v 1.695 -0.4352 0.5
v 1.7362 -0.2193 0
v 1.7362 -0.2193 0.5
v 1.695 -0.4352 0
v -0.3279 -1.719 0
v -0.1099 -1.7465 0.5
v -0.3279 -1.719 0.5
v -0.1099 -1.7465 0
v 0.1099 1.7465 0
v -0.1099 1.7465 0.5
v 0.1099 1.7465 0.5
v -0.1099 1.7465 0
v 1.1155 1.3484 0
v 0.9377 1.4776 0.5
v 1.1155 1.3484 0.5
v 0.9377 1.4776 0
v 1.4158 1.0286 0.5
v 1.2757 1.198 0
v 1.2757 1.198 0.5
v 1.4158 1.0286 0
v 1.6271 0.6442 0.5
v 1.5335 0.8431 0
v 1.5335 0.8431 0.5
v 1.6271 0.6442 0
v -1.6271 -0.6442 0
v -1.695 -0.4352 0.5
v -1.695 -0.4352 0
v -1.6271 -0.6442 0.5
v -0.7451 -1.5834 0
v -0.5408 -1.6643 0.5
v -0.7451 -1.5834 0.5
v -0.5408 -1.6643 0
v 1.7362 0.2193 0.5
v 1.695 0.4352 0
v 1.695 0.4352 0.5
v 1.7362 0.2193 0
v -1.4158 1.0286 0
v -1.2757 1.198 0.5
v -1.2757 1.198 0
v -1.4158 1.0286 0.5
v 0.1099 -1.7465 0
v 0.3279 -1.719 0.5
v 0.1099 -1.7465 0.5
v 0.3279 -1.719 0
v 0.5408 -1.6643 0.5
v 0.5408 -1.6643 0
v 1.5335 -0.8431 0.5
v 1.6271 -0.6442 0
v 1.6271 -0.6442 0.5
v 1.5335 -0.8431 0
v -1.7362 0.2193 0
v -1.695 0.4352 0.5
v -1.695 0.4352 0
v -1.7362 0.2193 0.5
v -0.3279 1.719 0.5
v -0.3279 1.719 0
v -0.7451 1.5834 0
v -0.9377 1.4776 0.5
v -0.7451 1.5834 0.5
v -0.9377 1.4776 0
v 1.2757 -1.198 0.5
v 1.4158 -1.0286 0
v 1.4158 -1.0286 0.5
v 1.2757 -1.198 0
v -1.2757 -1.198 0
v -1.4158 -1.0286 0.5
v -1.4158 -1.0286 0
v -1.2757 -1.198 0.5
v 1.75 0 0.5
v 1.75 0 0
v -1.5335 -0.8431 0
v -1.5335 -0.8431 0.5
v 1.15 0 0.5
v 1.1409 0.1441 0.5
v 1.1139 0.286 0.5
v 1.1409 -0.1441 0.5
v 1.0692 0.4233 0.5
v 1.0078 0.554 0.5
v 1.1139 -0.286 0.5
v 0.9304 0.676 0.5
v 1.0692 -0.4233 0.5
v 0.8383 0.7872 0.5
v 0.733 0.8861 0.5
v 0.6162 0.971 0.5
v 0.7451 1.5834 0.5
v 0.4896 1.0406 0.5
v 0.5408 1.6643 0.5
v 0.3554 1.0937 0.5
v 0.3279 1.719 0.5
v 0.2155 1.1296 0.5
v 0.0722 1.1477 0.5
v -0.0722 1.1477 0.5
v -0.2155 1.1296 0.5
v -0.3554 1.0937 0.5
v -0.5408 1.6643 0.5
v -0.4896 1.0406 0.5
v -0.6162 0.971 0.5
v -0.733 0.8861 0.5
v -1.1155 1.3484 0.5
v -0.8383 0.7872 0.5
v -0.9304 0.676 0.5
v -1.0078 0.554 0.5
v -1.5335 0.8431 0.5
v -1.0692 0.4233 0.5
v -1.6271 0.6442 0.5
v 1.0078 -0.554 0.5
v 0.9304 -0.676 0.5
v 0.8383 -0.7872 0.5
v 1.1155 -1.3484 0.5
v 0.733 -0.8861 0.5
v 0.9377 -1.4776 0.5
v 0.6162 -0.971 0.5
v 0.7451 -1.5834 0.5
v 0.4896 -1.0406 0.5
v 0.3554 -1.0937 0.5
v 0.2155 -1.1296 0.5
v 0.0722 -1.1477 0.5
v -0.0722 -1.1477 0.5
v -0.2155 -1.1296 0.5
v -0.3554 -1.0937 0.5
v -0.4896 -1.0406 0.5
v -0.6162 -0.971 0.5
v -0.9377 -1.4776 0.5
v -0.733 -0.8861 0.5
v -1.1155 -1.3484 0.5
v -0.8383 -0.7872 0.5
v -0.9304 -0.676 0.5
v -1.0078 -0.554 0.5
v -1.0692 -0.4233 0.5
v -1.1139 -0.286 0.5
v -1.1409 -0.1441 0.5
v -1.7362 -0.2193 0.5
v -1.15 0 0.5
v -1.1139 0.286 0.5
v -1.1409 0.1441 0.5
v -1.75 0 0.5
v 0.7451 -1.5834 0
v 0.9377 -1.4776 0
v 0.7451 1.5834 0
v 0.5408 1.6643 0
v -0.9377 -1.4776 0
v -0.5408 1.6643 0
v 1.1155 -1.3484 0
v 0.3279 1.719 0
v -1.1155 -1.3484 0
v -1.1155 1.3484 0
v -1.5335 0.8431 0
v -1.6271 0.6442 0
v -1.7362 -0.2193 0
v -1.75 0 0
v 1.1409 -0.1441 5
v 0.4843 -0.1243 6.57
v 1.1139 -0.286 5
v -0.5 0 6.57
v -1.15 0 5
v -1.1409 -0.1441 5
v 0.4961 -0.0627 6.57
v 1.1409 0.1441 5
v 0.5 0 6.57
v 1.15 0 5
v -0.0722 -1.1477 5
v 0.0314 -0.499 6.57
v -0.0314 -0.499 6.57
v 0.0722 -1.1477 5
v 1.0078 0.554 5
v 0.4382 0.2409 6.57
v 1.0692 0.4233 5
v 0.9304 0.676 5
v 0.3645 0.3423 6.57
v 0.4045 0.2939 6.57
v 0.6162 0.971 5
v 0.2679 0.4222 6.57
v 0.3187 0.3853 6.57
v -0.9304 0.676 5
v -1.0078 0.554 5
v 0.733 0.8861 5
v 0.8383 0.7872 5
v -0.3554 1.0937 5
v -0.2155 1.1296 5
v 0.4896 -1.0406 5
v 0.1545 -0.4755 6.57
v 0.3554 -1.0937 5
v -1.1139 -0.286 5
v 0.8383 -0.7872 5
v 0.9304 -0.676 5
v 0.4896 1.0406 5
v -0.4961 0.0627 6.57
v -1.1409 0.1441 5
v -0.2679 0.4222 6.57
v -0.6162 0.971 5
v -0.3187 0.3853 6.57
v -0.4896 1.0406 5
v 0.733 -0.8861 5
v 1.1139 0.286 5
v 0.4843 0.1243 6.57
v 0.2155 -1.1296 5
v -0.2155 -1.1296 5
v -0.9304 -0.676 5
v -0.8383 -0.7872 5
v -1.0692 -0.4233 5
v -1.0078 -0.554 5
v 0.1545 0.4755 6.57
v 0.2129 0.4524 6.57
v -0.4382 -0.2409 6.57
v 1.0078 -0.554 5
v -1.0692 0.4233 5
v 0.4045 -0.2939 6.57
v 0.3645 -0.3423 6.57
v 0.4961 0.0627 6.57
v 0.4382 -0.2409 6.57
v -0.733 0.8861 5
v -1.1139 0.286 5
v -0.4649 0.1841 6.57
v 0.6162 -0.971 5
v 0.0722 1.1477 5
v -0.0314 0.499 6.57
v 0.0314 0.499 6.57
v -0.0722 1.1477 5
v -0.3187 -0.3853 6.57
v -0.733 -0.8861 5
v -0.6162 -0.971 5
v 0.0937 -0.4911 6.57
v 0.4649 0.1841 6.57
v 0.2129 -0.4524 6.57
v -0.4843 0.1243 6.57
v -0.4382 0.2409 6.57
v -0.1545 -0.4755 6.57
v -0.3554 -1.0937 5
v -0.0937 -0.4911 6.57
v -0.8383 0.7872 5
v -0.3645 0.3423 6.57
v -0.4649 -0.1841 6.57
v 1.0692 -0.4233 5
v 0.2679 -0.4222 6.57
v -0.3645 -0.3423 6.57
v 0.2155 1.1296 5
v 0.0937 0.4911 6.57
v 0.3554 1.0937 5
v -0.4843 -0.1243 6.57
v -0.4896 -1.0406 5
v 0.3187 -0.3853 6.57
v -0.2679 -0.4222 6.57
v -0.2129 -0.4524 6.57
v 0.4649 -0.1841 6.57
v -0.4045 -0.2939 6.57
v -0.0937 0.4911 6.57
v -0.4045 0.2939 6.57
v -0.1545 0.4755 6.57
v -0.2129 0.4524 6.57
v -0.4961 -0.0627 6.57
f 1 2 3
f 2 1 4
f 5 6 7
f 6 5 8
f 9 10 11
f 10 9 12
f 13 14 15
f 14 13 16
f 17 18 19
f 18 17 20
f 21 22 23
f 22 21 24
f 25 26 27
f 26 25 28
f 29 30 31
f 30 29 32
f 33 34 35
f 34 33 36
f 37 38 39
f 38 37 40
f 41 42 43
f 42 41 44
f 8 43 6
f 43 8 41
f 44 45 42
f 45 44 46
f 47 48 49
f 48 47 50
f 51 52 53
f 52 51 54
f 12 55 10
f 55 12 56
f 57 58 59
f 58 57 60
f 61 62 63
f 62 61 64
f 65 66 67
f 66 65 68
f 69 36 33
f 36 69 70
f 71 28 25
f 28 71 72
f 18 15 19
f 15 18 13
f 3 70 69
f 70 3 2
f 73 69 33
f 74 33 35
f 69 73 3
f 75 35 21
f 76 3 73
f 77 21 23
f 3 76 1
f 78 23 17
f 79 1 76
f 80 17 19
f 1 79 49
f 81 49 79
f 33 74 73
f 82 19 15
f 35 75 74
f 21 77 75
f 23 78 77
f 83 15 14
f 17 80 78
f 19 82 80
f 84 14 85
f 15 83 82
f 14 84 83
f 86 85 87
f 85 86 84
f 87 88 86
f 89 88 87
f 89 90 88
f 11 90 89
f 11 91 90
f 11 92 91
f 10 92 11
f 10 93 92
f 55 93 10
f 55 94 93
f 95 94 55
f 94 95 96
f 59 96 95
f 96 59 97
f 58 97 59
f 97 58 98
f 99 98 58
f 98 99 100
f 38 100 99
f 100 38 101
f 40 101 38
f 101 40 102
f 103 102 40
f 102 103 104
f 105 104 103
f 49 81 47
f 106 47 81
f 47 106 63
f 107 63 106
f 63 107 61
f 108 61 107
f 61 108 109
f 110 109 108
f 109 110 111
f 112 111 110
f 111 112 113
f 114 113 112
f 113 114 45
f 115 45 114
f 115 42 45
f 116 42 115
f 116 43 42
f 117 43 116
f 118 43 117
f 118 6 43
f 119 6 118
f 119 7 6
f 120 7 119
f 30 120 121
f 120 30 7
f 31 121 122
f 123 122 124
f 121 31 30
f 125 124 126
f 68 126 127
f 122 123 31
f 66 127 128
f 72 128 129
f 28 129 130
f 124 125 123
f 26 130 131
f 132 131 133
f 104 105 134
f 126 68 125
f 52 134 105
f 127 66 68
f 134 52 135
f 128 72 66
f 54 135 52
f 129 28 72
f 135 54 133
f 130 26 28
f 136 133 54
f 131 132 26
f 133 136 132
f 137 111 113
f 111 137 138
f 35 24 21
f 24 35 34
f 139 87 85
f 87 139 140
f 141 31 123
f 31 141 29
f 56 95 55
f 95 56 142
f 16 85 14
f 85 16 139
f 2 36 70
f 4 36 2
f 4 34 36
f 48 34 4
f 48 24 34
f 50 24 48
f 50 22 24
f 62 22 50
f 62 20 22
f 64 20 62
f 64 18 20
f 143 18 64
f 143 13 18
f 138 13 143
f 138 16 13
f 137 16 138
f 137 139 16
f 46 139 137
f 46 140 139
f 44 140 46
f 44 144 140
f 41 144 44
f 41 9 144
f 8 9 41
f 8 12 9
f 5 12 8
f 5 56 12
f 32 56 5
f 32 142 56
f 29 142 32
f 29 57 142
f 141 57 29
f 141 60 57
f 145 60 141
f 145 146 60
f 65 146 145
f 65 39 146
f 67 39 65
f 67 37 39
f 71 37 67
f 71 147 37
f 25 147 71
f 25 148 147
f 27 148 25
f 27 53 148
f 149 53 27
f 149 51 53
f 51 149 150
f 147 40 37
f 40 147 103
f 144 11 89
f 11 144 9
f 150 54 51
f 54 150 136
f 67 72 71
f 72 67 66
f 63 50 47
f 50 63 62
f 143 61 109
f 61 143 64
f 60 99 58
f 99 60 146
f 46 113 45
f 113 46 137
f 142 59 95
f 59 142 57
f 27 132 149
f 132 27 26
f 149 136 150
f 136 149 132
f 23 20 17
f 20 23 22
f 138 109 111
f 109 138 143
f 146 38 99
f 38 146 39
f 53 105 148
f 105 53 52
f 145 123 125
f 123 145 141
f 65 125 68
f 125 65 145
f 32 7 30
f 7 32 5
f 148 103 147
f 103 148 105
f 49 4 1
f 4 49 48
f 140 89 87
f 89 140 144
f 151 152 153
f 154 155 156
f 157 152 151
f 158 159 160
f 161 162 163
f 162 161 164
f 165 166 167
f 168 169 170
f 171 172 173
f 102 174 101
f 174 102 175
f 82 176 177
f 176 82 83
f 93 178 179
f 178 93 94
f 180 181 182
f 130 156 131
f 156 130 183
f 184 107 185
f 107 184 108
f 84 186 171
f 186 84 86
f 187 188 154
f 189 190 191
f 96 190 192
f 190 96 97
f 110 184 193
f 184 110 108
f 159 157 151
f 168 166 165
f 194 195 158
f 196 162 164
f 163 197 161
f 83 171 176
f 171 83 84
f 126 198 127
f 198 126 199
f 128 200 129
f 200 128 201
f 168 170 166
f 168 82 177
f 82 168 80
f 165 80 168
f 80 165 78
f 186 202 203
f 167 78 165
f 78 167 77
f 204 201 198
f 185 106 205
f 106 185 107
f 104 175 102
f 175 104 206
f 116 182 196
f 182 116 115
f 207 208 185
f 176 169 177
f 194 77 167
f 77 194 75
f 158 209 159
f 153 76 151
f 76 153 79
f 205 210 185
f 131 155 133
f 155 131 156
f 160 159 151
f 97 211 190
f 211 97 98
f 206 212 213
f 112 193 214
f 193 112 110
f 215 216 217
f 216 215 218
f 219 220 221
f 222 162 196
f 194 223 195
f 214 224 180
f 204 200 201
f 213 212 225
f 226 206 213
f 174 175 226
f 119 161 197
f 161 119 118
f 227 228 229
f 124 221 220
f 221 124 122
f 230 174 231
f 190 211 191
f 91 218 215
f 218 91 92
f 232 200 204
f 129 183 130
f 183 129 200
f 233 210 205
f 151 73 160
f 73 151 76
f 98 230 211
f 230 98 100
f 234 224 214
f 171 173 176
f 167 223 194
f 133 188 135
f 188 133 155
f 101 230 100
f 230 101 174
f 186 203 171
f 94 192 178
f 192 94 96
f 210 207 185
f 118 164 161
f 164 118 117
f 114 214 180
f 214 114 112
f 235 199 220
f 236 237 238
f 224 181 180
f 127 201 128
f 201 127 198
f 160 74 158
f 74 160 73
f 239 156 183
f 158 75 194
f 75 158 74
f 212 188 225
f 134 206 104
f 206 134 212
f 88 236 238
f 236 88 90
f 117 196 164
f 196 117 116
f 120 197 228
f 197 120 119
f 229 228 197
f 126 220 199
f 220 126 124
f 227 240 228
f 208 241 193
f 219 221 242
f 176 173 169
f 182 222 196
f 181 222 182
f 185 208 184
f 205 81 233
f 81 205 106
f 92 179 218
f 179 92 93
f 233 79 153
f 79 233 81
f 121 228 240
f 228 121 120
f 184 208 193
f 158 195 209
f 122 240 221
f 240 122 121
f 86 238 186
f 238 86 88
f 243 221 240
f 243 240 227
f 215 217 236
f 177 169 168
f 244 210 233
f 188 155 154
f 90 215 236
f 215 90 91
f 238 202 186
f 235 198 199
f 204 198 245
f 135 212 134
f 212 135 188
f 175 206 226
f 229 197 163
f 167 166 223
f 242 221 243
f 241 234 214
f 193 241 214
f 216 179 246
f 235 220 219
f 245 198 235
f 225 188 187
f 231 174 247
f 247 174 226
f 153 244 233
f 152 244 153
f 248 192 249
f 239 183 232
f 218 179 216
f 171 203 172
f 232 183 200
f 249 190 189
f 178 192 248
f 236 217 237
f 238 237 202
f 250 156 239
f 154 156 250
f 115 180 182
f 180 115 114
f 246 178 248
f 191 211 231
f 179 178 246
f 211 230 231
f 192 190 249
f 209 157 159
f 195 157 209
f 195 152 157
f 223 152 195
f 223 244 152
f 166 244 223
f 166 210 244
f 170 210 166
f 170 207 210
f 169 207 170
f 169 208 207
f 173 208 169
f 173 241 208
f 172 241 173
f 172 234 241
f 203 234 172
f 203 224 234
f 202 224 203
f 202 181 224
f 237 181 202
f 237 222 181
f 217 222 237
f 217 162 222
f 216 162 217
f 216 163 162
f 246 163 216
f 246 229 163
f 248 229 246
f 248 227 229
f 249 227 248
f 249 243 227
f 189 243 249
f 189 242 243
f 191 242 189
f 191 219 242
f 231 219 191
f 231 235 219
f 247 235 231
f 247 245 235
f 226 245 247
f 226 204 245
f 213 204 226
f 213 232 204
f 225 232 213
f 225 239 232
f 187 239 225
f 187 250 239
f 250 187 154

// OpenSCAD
// file: util/standoff.scad
$fn = 50;

standoff(height=3, board_size=1.57);

translate([20, 20])
positive_standoff(height=3, board_size=1.57);


color("white")
translate([0, 0, 5.4])
mirror([0, 0, 1])
standoff_pin(height=3, board_size=1.57);

module standoff(height, board_size) {
  difference() {
    union() {
      cylinder(h=height, d=3.5);
    }

    translate([0, 0, .2])
    cylinder(h=height + board_size, d=2.1);

  }
  fillet(width=3.5, r=2);
}

module positive_standoff(height, board_size) {
  union() {
    cylinder(h=height, d=3.5);
    cylinder(h=height + board_size, d=2.5);
  }
  fillet(width=3.5, r=2);
}

module standoff_pin(height, board_size) {
  cylinder(h=0.5, d=3.5);
  hull() {
    cylinder(h=height, d=2.3);

    translate([0, 0, height + board_size - 0.1])
    cylinder(h=0.1, d=1);
  }
}

module fillet(width, r) {
  rotate_extrude()
  translate([width/2, 0])
  difference() {
    square(r);

    translate([r, r])
    circle(r);
  }
}
// main file
use <util/standoff.scad>;

standoff_pin(height=5, board_size=1.57);
